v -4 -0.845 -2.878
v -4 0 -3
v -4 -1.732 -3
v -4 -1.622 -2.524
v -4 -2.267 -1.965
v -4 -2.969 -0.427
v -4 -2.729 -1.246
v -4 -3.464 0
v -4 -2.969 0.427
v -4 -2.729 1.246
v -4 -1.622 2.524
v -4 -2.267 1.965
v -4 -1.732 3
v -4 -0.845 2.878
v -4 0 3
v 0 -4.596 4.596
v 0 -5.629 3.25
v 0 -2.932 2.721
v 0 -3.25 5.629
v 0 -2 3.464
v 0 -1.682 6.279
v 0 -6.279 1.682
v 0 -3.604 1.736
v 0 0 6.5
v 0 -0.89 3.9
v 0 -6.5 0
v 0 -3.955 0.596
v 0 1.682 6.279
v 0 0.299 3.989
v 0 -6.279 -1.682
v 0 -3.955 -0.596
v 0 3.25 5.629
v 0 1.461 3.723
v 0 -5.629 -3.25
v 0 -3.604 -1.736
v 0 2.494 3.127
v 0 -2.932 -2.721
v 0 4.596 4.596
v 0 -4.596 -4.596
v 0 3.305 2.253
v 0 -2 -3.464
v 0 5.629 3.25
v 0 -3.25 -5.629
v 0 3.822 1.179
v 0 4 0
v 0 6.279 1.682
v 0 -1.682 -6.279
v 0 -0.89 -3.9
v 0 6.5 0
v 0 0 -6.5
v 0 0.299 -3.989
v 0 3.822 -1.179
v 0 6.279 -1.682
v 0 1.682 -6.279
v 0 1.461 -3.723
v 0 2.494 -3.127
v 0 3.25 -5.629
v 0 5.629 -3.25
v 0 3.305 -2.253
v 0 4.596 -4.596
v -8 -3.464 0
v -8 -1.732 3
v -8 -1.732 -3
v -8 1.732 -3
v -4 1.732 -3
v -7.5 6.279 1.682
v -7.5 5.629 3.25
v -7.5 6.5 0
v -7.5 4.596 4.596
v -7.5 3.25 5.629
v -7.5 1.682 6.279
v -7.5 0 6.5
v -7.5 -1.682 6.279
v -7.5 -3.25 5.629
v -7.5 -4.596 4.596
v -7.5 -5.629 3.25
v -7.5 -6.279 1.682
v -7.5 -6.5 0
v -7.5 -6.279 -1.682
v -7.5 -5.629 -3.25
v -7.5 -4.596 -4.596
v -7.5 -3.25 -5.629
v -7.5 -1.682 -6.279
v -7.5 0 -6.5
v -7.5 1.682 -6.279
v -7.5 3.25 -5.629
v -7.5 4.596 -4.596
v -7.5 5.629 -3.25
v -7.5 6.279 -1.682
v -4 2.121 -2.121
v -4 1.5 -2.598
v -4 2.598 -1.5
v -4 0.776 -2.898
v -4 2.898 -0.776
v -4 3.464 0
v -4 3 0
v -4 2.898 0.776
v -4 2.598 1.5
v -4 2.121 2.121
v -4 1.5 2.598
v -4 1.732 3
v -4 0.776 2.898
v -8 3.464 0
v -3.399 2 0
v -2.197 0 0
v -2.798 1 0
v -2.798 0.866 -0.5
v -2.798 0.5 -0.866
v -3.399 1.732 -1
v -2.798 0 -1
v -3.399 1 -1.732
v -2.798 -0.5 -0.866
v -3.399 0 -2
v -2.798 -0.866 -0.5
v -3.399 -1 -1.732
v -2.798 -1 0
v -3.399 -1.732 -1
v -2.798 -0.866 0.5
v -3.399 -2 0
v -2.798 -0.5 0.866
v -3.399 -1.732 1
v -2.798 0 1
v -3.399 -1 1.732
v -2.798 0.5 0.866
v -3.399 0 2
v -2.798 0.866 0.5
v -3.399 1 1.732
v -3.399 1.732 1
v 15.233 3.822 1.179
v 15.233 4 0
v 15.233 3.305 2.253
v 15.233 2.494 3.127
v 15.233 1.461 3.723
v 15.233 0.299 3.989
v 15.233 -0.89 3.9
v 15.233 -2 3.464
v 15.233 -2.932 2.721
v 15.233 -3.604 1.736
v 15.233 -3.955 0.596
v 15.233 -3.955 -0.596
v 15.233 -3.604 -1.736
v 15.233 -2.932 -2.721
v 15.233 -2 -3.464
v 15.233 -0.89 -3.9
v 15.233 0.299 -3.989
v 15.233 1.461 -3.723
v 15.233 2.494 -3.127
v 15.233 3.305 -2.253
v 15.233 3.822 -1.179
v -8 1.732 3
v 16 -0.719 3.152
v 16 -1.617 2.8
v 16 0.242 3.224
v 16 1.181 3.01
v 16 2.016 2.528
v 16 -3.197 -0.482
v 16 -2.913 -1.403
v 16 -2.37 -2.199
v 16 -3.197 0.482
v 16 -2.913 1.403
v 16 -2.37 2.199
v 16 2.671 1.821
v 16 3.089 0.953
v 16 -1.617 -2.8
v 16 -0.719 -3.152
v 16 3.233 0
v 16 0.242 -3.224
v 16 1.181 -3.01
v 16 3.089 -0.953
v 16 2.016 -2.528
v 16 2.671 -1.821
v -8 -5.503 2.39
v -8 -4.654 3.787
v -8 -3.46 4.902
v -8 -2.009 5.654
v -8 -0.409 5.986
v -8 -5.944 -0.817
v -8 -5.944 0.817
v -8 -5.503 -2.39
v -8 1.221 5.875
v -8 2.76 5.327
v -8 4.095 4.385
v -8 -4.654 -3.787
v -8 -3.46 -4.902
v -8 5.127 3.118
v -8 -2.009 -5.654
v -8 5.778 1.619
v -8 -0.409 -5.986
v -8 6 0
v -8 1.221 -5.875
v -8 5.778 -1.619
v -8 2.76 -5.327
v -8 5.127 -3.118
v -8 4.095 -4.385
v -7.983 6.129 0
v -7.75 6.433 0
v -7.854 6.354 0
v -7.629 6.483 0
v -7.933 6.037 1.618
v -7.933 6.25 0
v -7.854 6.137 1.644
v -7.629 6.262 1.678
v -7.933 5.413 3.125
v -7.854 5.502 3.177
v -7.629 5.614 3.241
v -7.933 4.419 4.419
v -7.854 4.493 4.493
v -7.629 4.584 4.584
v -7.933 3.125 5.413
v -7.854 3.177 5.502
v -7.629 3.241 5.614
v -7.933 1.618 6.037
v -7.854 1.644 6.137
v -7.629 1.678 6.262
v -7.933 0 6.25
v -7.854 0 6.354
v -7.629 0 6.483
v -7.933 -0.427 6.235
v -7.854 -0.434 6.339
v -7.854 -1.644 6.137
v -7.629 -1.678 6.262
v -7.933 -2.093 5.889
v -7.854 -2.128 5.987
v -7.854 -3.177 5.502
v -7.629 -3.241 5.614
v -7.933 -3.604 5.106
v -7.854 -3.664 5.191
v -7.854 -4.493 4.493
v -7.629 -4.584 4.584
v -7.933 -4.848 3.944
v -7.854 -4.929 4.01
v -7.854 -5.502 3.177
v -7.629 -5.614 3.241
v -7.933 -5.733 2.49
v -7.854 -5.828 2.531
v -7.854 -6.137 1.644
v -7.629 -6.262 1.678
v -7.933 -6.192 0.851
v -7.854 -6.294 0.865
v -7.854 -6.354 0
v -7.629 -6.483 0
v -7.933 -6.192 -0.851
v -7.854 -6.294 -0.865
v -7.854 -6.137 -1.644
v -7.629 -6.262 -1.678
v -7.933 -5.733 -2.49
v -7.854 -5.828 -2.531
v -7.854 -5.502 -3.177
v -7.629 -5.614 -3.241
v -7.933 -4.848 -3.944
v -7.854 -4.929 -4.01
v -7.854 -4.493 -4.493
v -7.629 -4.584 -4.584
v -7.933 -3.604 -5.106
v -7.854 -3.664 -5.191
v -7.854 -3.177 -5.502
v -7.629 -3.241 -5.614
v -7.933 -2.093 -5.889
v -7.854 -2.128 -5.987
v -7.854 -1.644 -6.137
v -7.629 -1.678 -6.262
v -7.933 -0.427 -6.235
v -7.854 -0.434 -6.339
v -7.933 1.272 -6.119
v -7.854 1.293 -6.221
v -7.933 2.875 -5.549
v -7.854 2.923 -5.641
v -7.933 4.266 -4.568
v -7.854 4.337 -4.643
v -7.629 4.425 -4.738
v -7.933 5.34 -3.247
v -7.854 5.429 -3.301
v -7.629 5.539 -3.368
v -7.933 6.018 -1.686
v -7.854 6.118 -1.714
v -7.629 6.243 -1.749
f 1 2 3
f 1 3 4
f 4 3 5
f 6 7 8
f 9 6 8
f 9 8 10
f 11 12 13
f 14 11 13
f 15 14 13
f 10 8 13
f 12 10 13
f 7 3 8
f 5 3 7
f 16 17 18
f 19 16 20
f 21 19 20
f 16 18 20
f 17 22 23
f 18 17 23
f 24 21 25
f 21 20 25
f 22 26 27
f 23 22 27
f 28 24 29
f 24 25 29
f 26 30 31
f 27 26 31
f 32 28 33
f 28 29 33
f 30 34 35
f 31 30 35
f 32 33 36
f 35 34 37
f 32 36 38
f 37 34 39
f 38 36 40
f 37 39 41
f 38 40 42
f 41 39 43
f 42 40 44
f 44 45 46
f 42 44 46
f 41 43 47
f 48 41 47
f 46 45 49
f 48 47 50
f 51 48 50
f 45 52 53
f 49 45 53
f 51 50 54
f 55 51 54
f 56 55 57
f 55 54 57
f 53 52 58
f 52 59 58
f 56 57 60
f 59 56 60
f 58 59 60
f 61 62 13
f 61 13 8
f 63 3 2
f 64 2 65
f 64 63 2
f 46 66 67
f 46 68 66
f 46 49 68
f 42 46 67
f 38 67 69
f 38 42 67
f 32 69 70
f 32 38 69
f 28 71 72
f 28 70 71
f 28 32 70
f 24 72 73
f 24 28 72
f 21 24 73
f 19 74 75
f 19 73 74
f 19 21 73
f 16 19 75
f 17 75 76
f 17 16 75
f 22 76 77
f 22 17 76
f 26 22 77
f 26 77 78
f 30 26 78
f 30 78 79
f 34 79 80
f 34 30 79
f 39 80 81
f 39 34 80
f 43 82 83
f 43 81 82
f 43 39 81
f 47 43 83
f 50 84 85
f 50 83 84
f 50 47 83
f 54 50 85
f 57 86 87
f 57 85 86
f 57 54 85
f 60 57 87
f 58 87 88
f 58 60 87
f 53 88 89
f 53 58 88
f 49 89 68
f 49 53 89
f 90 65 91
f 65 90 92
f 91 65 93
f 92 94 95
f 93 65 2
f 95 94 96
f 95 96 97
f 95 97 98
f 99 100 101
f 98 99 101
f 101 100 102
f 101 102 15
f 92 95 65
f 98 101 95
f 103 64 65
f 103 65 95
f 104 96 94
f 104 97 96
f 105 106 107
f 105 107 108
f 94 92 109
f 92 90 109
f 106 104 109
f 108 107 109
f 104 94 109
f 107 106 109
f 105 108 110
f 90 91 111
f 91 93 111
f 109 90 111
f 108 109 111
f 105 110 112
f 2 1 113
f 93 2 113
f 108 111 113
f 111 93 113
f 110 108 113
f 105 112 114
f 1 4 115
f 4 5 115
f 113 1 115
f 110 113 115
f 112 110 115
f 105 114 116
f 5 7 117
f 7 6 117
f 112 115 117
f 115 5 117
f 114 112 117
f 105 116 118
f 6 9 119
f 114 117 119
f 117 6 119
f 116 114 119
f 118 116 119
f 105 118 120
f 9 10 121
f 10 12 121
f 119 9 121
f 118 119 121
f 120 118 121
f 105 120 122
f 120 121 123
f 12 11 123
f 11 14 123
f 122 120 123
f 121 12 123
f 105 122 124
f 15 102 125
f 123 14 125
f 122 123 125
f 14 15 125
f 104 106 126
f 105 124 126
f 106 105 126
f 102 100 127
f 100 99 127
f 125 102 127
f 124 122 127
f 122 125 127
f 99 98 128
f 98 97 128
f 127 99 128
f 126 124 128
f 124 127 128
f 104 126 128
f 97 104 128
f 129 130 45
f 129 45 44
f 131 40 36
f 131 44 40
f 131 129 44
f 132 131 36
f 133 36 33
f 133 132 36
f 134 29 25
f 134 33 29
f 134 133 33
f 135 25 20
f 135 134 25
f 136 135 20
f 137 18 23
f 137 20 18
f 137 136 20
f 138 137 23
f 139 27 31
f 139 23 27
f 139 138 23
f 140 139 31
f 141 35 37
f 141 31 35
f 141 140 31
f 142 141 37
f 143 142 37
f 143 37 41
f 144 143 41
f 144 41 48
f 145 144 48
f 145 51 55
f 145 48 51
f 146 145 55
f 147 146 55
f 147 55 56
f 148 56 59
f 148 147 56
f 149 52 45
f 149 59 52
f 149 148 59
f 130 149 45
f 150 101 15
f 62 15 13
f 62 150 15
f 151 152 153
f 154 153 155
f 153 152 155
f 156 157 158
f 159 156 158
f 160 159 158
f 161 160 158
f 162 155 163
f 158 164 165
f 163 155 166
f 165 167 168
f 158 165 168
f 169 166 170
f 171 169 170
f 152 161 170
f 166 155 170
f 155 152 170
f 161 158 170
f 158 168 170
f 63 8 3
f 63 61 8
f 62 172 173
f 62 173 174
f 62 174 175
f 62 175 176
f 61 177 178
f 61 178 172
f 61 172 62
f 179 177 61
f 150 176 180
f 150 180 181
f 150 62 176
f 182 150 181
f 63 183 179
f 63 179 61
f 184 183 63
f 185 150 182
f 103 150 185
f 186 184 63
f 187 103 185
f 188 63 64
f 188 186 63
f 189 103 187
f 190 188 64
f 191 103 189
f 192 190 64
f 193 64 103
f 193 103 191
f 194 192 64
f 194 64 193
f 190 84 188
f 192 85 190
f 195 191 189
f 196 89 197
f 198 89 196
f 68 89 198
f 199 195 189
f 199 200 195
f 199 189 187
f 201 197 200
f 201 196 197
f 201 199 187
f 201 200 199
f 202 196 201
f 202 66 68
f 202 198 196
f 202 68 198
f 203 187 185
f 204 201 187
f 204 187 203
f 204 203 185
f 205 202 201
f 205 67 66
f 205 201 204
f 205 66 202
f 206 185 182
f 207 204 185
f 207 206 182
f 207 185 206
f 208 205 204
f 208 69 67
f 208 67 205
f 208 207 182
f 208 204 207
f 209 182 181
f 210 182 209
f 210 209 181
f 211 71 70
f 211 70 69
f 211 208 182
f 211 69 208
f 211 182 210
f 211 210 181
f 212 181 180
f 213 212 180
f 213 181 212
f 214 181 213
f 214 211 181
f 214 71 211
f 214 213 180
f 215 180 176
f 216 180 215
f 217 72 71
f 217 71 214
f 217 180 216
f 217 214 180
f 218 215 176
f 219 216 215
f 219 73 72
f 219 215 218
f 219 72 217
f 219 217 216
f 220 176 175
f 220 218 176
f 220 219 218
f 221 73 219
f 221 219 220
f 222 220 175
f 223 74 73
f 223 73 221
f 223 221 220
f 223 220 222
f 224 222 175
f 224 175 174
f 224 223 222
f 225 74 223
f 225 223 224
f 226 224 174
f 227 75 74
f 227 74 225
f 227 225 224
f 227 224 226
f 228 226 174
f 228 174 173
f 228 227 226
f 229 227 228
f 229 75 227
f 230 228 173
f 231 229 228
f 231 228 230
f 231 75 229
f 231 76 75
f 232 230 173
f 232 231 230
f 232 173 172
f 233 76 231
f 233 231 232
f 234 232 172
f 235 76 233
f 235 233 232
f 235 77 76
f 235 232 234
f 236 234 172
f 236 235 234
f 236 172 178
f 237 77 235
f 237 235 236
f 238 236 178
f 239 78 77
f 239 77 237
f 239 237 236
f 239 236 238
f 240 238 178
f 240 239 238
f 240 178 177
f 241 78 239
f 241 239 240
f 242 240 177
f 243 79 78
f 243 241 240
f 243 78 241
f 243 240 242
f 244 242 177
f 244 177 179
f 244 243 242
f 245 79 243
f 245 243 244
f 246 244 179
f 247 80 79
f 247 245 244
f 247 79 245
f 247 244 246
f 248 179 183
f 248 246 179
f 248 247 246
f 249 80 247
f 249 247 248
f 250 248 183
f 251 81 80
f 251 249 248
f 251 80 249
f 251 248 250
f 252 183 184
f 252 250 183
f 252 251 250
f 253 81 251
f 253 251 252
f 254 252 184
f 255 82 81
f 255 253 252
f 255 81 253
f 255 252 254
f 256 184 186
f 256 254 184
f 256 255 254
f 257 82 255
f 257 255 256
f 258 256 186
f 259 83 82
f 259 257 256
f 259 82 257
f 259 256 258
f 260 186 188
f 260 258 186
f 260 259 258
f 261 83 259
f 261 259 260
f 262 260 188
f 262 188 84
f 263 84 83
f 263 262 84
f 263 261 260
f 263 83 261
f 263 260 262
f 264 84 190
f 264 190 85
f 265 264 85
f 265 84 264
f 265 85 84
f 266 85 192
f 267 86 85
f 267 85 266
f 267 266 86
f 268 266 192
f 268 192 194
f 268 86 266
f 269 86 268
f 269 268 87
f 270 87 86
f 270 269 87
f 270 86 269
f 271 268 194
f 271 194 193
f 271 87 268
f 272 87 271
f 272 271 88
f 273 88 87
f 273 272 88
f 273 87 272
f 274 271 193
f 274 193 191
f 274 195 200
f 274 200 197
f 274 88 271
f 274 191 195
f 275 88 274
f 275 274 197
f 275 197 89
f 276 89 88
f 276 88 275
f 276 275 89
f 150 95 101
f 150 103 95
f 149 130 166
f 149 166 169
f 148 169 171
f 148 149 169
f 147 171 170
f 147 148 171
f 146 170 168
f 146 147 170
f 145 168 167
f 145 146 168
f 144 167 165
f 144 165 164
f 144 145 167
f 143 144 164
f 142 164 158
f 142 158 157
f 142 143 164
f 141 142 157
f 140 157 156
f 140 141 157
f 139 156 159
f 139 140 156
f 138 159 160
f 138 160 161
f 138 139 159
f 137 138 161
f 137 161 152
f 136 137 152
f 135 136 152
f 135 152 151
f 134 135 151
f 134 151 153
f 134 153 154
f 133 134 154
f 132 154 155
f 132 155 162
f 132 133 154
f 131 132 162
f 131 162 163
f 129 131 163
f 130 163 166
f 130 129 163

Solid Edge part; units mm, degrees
sketch "Sketch1" plane through (0, 0, 0) normal (0, 0, 1) x (1, 0, 0)
  line L0 (-8, 0) -> (-8, 6)
  arc A0 (-8, 6) -> (-7.5, 6.5) centre (-7.5, 6) cw
  line L1 (-7.5, 6.5) -> (0, 6.5)
  line L2 (0, 6.5) -> (0, 4)
  line L3 (0, 4) -> (15.233, 4)
  line L4 (15.233, 4) -> (16, 3.233)
  line L5 (16, 3.233) -> (16, 0)
  line L6 (16, 0) -> (-8, 0)
revolve "RevolvedProtrusion1" add sketch "Sketch1" angle 360 about axis through (16, 0, 0) along (-1, 0, 0)
sketch "Sketch2" plane through (-8, 0, 0) normal (1, 0, 0) x (0, 1, 0)
  line L0 (-1.7321, 3) -> (-3.4641, 0)
  line L1 (-3.4641, 0) -> (-1.7321, -3)
  line L2 (-1.7321, -3) -> (1.7321, -3)
  line L3 (1.7321, -3) -> (3.4641, 0)
  line L4 (3.4641, 0) -> (1.7321, 3)
  line L5 (1.7321, 3) -> (-1.7321, 3)
extrude "ExtrudedCutout_1" cut sketch "Sketch2" along normal blind 4
sketch "Sketch3" plane through (0, 0, 0) normal (0, 0, 1) x (1, 0, 0)
  line L0 (-4, 0) -> (-4, 3)
  line L1 (-4, 3) -> (-2.1974, 0)
  line L2 (-2.1974, 0) -> (-4, 0)
revolve "RevolvedCutout1" cut sketch "Sketch3" angle 360 about axis through (-2.1974, 0, 0) along (-1, 0, 0)
cosmetic_thread "Rosca_3" size "M8" thread depth 14
properties part number "07160-08X16"
